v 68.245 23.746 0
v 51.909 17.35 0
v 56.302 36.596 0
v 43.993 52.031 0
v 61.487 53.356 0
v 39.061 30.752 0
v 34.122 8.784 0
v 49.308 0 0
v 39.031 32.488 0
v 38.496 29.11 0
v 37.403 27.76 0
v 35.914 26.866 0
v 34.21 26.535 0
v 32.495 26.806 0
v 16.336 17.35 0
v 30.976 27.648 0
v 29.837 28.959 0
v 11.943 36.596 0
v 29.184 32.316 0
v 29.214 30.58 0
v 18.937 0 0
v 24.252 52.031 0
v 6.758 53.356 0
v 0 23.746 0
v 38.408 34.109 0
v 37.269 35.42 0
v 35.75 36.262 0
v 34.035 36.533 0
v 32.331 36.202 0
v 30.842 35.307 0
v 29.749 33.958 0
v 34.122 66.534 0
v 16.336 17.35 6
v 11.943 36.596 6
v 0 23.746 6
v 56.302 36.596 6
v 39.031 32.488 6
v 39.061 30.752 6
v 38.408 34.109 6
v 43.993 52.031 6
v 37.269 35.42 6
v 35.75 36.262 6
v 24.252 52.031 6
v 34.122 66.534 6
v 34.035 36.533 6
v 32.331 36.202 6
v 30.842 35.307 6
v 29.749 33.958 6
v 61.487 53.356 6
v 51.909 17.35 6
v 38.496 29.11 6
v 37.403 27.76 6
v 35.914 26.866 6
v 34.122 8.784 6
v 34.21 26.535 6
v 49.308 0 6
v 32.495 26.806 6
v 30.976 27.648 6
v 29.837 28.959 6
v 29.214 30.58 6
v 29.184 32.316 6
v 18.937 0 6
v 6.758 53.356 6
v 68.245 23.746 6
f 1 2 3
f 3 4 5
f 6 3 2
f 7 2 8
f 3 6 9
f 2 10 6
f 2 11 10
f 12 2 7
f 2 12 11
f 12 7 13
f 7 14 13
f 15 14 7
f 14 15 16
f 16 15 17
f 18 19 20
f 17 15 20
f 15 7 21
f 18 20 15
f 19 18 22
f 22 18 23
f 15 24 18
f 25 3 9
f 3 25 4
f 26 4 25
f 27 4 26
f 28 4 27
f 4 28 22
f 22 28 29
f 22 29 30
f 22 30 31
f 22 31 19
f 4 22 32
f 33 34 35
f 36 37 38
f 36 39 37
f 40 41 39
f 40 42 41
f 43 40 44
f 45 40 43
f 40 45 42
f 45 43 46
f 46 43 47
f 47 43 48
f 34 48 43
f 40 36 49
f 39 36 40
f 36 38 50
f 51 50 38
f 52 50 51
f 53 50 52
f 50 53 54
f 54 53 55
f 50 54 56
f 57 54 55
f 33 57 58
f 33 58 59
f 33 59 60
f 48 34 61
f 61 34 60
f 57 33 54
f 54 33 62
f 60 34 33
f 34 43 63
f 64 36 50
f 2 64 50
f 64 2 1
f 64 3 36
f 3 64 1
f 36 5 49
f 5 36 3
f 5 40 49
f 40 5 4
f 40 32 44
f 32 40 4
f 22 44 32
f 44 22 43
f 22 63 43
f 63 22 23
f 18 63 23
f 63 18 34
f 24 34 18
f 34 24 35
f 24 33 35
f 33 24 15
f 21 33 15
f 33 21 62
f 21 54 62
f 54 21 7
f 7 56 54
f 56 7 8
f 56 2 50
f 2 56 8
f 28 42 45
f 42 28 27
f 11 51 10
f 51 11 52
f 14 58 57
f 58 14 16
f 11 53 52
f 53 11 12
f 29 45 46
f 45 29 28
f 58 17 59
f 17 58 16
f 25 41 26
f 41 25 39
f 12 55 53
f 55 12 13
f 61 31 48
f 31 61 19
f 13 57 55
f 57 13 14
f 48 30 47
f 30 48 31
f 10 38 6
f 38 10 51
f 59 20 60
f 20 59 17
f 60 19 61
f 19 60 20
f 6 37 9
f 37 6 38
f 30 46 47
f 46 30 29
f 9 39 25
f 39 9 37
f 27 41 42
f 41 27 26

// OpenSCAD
$fn = 32;

// ----------------------------------------------------------------------
// Star wheel: 7-point blunt, R35
// ----------------------------------------------------------------------

// --- parameters (mm) ---
n_points = 7;             // number of points / teeth
r_out = 35;               // tip radius
r_in = 22.75;             // root radius
bore_r = 5;               // centre bore radius
plate_t = 6;              // plate thickness, Z (extrusion height)
bore_d = 10;              // centre bore diameter

profile = [[34.122, 66.534], [24.252, 52.031], [6.758, 53.356], [11.943, 36.596], [0, 23.746], [16.336, 17.35], [18.937, 0], [34.122, 8.784], [49.308, 0], [51.909, 17.35], [68.245, 23.746], [56.302, 36.596], [61.487, 53.356], [43.993, 52.031]];  // primary outline, 14 points, counter clockwise
void_1 = [[39.031, 32.488], [38.408, 34.109], [37.269, 35.42], [35.75, 36.262], [34.035, 36.533], [32.331, 36.202], [30.842, 35.307], [29.749, 33.958], [29.184, 32.316], [29.214, 30.58], [29.837, 28.959], [30.976, 27.648], [32.495, 26.806], [34.21, 26.535], [35.914, 26.866], [37.403, 27.76], [38.496, 29.11], [39.061, 30.752]];  // centre bore, 18 points

// --- the one profile operation ---
difference() {
  linear_extrude(height = plate_t) polygon(points = profile);
  translate([0, 0, -1])
    linear_extrude(height = plate_t + 2) polygon(points = void_1);
}
